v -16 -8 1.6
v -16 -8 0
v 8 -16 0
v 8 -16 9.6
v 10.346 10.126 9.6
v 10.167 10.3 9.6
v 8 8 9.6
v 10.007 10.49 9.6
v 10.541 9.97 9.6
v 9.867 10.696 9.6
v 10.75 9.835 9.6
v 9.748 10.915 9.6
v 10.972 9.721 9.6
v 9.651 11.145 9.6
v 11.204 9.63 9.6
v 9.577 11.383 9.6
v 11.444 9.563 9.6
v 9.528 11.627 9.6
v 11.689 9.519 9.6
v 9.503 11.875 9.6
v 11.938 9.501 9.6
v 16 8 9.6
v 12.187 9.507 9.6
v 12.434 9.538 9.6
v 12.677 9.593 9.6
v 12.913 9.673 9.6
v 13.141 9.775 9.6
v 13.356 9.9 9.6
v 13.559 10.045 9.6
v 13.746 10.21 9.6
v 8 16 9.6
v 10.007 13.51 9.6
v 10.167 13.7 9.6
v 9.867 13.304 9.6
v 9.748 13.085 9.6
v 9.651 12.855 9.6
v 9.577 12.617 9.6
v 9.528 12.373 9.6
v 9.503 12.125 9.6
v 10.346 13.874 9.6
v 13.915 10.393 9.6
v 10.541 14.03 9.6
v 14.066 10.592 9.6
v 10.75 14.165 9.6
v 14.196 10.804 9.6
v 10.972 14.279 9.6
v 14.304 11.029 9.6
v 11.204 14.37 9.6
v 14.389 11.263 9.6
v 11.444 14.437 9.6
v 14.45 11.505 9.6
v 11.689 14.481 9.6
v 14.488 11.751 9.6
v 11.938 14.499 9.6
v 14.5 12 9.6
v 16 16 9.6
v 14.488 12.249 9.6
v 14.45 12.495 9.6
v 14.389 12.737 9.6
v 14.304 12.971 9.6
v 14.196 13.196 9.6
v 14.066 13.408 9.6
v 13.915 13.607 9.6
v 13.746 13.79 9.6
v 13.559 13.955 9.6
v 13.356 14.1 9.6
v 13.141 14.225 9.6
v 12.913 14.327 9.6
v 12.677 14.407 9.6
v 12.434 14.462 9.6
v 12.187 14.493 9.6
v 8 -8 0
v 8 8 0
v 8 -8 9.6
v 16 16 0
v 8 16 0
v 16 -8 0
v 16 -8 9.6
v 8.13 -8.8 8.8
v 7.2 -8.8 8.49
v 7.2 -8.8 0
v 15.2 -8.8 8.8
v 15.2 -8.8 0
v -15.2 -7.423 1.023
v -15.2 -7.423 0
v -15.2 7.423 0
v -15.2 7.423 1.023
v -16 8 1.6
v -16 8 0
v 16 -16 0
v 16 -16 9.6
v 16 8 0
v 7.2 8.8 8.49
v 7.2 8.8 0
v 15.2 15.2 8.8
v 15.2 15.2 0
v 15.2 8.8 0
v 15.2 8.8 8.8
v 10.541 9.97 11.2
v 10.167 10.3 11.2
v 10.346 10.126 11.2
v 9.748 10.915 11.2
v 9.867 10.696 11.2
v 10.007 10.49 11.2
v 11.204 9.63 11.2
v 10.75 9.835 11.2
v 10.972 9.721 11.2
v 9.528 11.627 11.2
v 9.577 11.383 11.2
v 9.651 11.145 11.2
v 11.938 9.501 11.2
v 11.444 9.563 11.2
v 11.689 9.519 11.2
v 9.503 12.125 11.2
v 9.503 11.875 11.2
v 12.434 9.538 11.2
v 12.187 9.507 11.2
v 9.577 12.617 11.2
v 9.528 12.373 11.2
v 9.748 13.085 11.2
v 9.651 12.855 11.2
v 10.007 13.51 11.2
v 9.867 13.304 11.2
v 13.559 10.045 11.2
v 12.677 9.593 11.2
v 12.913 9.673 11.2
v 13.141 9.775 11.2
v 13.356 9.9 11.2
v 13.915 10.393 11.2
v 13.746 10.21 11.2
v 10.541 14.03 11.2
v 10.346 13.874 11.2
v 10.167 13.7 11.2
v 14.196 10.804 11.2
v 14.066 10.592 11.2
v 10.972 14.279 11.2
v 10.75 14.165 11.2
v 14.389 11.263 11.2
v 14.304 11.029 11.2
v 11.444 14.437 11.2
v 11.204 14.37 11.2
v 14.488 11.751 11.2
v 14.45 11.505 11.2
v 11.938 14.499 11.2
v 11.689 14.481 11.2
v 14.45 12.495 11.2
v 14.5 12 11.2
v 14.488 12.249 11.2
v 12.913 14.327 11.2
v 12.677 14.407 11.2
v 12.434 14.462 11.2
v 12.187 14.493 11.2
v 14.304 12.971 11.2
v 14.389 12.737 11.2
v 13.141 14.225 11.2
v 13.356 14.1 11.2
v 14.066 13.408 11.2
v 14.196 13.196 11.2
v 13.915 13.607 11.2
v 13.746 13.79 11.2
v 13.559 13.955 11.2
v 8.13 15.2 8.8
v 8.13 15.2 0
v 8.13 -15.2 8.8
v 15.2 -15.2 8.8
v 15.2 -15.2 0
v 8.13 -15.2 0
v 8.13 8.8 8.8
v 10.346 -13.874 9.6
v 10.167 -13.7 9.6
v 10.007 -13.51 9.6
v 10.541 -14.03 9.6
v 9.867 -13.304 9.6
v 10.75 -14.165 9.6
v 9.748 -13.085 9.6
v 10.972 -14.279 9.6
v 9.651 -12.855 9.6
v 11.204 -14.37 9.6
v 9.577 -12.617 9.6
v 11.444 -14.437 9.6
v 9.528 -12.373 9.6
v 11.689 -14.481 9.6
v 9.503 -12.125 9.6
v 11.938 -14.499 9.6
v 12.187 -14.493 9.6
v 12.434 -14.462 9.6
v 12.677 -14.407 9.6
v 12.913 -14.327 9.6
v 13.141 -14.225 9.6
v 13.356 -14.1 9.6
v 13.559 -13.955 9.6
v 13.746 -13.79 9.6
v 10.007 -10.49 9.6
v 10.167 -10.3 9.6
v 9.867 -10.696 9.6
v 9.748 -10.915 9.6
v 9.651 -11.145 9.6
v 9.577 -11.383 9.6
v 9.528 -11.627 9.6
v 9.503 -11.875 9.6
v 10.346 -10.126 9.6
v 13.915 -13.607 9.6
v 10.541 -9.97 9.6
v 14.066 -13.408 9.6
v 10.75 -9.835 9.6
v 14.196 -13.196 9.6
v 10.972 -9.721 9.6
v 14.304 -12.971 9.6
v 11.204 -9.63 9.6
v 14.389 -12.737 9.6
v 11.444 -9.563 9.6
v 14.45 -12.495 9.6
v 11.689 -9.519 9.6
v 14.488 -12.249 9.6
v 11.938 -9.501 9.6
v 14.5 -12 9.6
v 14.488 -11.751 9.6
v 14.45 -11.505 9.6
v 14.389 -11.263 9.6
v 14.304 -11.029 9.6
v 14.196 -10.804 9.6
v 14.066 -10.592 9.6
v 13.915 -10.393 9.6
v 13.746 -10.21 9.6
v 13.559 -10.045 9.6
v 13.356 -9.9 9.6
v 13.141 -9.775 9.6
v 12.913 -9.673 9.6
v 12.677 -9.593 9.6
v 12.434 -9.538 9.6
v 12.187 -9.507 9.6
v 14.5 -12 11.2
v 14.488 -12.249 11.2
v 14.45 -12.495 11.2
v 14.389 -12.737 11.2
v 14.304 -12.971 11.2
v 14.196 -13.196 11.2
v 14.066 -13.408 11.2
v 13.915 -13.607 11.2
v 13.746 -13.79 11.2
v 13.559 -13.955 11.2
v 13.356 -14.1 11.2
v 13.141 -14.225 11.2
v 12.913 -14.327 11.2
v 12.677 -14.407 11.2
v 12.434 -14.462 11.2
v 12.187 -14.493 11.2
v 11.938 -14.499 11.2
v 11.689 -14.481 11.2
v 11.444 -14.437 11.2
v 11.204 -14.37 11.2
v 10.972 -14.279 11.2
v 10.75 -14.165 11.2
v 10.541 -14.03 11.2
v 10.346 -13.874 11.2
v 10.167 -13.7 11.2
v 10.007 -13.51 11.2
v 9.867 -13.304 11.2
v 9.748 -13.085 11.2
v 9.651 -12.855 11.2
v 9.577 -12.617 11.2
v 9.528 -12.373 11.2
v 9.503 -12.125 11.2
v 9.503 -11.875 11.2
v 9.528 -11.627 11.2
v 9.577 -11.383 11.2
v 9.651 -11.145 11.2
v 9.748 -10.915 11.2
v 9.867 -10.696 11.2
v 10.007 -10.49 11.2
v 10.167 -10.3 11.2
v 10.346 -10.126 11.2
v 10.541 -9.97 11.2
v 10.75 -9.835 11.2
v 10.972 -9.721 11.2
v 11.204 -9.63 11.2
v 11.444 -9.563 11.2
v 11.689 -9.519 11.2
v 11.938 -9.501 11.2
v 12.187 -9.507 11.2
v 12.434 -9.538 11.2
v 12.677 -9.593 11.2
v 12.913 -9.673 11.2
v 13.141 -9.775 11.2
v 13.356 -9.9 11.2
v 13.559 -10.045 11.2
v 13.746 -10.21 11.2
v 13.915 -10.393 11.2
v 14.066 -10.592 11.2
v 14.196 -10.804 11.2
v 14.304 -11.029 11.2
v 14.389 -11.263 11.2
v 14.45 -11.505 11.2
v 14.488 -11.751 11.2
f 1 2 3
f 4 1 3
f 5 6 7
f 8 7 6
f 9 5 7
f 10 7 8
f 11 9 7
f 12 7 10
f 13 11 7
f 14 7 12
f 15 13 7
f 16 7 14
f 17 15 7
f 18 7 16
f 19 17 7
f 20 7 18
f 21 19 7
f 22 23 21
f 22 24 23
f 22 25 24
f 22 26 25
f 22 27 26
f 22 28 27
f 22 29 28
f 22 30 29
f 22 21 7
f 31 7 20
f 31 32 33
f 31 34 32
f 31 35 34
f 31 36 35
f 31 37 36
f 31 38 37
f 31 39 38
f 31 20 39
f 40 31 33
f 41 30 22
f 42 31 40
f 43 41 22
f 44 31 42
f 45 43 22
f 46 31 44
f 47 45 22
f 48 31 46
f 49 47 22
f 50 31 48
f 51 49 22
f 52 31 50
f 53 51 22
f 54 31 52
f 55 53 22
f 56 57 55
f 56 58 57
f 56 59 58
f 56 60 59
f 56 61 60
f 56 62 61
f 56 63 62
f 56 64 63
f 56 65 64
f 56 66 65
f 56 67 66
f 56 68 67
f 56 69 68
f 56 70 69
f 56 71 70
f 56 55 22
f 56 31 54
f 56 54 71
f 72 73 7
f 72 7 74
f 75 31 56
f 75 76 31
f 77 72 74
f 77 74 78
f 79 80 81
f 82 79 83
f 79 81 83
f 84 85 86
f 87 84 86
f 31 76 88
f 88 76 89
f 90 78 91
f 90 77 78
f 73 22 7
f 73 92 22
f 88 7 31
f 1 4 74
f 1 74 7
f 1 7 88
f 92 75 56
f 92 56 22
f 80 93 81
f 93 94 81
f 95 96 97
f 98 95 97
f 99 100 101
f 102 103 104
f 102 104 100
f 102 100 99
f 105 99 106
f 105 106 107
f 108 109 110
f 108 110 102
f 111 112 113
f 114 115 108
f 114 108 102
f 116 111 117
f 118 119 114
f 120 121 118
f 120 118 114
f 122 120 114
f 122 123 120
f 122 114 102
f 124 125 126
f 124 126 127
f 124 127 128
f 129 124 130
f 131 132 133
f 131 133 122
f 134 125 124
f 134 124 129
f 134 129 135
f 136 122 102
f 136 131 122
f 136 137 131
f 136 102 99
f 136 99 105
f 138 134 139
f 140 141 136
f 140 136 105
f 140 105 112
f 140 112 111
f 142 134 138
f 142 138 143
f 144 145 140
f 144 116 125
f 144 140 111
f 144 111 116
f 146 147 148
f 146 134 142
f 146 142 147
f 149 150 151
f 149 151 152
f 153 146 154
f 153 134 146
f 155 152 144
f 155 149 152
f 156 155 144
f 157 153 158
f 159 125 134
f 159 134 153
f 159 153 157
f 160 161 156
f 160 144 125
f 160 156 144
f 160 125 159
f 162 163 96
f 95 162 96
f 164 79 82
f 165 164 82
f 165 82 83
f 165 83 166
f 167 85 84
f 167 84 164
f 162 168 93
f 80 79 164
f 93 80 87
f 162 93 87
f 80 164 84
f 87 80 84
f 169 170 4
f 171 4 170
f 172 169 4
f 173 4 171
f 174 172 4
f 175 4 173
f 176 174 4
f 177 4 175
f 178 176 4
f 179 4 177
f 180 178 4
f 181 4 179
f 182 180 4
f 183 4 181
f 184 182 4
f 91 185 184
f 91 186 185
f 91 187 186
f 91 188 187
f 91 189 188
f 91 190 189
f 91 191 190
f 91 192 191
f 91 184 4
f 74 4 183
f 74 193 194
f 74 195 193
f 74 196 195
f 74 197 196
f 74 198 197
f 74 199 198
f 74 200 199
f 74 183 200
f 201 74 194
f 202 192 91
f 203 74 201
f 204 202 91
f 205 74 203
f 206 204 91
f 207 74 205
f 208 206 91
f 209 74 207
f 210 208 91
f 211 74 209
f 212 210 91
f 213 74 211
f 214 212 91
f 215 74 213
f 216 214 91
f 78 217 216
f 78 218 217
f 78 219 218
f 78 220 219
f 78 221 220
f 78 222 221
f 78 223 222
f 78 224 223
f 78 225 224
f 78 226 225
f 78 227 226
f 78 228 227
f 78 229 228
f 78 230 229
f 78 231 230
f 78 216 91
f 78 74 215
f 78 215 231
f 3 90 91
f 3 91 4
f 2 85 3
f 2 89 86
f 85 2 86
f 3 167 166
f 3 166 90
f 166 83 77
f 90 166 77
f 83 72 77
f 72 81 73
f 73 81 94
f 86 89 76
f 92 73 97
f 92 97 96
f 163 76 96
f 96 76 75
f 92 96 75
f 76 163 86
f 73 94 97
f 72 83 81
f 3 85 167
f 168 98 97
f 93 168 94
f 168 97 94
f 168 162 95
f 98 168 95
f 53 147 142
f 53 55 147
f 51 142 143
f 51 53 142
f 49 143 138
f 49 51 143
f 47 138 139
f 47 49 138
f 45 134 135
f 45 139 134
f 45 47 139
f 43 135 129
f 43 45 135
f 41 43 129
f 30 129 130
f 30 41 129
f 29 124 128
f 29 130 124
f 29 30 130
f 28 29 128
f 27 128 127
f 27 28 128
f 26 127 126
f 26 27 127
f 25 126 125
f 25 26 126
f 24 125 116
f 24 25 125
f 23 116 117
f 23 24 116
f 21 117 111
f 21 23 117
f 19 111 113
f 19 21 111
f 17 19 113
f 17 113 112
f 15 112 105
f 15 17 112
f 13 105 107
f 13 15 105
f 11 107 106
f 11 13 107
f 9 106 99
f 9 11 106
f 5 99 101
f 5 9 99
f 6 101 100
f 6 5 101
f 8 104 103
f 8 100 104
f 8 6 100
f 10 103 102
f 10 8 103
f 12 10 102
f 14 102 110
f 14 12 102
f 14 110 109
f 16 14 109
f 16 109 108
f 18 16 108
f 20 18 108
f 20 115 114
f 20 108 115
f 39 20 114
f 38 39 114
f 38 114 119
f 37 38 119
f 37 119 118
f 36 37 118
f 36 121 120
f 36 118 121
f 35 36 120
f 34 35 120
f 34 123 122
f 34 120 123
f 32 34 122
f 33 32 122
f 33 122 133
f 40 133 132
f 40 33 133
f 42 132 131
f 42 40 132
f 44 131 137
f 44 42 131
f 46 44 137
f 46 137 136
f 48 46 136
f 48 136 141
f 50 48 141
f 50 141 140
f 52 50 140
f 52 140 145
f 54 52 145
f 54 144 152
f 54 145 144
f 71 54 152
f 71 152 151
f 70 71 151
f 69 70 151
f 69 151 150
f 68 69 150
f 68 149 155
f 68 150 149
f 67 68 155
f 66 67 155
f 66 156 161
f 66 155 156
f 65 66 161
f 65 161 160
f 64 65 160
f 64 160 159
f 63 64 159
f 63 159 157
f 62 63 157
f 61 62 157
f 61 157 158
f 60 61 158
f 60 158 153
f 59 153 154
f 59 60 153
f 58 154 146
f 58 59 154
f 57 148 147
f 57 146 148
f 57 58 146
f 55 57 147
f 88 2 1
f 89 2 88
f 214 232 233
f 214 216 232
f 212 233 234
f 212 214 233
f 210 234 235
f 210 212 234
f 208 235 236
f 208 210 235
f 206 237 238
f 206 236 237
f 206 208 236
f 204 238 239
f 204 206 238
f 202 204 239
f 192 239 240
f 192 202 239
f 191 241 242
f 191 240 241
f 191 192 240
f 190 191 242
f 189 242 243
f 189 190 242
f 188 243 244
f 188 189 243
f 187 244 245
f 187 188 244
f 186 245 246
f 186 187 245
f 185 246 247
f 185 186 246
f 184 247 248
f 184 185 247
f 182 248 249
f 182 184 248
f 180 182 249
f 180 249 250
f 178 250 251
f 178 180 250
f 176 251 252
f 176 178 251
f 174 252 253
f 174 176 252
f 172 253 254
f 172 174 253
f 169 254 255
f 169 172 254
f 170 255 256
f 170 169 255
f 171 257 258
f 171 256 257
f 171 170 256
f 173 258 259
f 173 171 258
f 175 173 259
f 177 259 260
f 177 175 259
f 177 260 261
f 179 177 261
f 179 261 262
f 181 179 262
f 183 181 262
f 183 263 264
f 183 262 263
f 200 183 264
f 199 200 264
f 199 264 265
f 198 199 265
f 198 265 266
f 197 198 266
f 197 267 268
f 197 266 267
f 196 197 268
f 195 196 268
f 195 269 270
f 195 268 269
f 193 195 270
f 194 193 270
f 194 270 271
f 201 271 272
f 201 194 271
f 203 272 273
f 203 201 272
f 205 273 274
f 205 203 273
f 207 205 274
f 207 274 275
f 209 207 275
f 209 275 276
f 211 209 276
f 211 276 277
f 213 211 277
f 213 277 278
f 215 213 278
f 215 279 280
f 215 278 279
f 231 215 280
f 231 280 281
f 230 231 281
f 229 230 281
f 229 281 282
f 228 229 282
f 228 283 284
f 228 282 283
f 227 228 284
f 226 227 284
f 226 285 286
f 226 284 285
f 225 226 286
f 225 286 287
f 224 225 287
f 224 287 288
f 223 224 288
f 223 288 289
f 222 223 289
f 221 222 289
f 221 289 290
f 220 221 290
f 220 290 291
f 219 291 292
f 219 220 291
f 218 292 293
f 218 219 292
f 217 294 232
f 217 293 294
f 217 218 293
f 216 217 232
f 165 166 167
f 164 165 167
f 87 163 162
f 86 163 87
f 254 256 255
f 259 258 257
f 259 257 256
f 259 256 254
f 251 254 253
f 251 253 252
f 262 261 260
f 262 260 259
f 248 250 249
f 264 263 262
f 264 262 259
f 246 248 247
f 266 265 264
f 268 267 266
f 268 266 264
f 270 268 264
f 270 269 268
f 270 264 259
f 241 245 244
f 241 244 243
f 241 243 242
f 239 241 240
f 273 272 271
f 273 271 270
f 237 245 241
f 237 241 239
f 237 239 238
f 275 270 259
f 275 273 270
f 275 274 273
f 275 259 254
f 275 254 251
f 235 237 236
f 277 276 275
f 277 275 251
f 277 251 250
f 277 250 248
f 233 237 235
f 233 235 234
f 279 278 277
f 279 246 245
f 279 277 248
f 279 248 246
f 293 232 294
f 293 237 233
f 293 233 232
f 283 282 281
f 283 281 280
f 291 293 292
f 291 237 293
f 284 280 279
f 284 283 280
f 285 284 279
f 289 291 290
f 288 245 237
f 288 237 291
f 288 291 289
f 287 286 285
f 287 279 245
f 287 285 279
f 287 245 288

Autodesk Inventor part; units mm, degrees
ref_plane "YZ Plane" through (0, 0, 0) normal (1, 0, 0) x (0, 1, 0)
ref_plane "XZ Plane" through (0, 0, 0) normal (0, 1, 0) x (-1, 0, 0)
ref_plane "XY Plane" through (0, 0, 0) normal (0, 0, 1) x (1, 0, 0)
sketch "Sketch1" plane through (0, 0, 0) normal (0, 0, 1) x (1, 0, 0)
  line L0 (-22.4, 0) -> (22.4, 0) construction
  line L1 (0, -22.4) -> (0, 22.4) construction
  line L2 (-16, 16) -> (16, 16)
  line L3 (16, 16) -> (16, -16)
  line L4 (16, -16) -> (-16, -16)
  line L5 (-16, -16) -> (-16, 16)
  line L6 (8, 16) -> (-16, 8)
  line L7 (-16, -8) -> (8, -16)
  line L8 (16, 8) -> (8, 8)
  line L9 (8, 8) -> (8, -8)
  line L10 (8, -8) -> (16, -8)
  point P0 (-16, 0)
  point P1 (0, 16)
  point P2 (8, 0)
  dimension "d0" = 32
  dimension "d1" = 32
  dimension "d5" = 16
  dimension "d9" = 8
  dimension "d10" = 16
extrude "Extrusion1" add sketch "Sketch1" along normal blind 9.6 contours L2 L3 L8 L9 L10 L4 L7 L5 L6 | L3 L10 L9 L8
sketch "Sketch2" plane through (0, 0, 0) normal (0, 1, 0) x (-1, 0, 0)
  line L0 (-16, 0) -> (-16, 9.6) projected
  line L1 (-16, 9.6) -> (-8, 9.6) projected
  line L2 (16, 0) -> (16, 9.6) projected
  line L3 (16, 0) -> (-16, 0)
  line L4 (-8, 9.6) -> (16, 1.6)
  dimension "d6" = 1.6
extrude "Extrusion2" cut sketch "Sketch2" along normal through all both and the other way through all keep common part
extrude "Extrusion4" cut sketch "Sketch1" along normal through all both and the other way through all contours L3 L10 L9 L8
shell "Shell1" thickness 0.8 removed faces 1 at (-8, 2.6667, 0)
sketch "Sketch3" plane through (0, 0, 9.6) normal (0, 0, 1) x (1, 0, 0)
  line L0 (16, 16) -> (16, -16) construction
  line L1 (-22.4, 0) -> (22.4, 0) construction
  line L2 (12, 12) -> (12, -12) construction
  circle A0 centre (12, 12) radius 2.5
  circle A1 centre (12, -12) radius 2.5
  point P0 (12, 0)
  dimension "d11" = 4
  dimension "d12" = 24
  dimension "d13" = 5
extrude "Extrusion3" add sketch "Sketch3" along normal blind 1.6
properties part number "LEGO Brick 4858" material "Steel"
